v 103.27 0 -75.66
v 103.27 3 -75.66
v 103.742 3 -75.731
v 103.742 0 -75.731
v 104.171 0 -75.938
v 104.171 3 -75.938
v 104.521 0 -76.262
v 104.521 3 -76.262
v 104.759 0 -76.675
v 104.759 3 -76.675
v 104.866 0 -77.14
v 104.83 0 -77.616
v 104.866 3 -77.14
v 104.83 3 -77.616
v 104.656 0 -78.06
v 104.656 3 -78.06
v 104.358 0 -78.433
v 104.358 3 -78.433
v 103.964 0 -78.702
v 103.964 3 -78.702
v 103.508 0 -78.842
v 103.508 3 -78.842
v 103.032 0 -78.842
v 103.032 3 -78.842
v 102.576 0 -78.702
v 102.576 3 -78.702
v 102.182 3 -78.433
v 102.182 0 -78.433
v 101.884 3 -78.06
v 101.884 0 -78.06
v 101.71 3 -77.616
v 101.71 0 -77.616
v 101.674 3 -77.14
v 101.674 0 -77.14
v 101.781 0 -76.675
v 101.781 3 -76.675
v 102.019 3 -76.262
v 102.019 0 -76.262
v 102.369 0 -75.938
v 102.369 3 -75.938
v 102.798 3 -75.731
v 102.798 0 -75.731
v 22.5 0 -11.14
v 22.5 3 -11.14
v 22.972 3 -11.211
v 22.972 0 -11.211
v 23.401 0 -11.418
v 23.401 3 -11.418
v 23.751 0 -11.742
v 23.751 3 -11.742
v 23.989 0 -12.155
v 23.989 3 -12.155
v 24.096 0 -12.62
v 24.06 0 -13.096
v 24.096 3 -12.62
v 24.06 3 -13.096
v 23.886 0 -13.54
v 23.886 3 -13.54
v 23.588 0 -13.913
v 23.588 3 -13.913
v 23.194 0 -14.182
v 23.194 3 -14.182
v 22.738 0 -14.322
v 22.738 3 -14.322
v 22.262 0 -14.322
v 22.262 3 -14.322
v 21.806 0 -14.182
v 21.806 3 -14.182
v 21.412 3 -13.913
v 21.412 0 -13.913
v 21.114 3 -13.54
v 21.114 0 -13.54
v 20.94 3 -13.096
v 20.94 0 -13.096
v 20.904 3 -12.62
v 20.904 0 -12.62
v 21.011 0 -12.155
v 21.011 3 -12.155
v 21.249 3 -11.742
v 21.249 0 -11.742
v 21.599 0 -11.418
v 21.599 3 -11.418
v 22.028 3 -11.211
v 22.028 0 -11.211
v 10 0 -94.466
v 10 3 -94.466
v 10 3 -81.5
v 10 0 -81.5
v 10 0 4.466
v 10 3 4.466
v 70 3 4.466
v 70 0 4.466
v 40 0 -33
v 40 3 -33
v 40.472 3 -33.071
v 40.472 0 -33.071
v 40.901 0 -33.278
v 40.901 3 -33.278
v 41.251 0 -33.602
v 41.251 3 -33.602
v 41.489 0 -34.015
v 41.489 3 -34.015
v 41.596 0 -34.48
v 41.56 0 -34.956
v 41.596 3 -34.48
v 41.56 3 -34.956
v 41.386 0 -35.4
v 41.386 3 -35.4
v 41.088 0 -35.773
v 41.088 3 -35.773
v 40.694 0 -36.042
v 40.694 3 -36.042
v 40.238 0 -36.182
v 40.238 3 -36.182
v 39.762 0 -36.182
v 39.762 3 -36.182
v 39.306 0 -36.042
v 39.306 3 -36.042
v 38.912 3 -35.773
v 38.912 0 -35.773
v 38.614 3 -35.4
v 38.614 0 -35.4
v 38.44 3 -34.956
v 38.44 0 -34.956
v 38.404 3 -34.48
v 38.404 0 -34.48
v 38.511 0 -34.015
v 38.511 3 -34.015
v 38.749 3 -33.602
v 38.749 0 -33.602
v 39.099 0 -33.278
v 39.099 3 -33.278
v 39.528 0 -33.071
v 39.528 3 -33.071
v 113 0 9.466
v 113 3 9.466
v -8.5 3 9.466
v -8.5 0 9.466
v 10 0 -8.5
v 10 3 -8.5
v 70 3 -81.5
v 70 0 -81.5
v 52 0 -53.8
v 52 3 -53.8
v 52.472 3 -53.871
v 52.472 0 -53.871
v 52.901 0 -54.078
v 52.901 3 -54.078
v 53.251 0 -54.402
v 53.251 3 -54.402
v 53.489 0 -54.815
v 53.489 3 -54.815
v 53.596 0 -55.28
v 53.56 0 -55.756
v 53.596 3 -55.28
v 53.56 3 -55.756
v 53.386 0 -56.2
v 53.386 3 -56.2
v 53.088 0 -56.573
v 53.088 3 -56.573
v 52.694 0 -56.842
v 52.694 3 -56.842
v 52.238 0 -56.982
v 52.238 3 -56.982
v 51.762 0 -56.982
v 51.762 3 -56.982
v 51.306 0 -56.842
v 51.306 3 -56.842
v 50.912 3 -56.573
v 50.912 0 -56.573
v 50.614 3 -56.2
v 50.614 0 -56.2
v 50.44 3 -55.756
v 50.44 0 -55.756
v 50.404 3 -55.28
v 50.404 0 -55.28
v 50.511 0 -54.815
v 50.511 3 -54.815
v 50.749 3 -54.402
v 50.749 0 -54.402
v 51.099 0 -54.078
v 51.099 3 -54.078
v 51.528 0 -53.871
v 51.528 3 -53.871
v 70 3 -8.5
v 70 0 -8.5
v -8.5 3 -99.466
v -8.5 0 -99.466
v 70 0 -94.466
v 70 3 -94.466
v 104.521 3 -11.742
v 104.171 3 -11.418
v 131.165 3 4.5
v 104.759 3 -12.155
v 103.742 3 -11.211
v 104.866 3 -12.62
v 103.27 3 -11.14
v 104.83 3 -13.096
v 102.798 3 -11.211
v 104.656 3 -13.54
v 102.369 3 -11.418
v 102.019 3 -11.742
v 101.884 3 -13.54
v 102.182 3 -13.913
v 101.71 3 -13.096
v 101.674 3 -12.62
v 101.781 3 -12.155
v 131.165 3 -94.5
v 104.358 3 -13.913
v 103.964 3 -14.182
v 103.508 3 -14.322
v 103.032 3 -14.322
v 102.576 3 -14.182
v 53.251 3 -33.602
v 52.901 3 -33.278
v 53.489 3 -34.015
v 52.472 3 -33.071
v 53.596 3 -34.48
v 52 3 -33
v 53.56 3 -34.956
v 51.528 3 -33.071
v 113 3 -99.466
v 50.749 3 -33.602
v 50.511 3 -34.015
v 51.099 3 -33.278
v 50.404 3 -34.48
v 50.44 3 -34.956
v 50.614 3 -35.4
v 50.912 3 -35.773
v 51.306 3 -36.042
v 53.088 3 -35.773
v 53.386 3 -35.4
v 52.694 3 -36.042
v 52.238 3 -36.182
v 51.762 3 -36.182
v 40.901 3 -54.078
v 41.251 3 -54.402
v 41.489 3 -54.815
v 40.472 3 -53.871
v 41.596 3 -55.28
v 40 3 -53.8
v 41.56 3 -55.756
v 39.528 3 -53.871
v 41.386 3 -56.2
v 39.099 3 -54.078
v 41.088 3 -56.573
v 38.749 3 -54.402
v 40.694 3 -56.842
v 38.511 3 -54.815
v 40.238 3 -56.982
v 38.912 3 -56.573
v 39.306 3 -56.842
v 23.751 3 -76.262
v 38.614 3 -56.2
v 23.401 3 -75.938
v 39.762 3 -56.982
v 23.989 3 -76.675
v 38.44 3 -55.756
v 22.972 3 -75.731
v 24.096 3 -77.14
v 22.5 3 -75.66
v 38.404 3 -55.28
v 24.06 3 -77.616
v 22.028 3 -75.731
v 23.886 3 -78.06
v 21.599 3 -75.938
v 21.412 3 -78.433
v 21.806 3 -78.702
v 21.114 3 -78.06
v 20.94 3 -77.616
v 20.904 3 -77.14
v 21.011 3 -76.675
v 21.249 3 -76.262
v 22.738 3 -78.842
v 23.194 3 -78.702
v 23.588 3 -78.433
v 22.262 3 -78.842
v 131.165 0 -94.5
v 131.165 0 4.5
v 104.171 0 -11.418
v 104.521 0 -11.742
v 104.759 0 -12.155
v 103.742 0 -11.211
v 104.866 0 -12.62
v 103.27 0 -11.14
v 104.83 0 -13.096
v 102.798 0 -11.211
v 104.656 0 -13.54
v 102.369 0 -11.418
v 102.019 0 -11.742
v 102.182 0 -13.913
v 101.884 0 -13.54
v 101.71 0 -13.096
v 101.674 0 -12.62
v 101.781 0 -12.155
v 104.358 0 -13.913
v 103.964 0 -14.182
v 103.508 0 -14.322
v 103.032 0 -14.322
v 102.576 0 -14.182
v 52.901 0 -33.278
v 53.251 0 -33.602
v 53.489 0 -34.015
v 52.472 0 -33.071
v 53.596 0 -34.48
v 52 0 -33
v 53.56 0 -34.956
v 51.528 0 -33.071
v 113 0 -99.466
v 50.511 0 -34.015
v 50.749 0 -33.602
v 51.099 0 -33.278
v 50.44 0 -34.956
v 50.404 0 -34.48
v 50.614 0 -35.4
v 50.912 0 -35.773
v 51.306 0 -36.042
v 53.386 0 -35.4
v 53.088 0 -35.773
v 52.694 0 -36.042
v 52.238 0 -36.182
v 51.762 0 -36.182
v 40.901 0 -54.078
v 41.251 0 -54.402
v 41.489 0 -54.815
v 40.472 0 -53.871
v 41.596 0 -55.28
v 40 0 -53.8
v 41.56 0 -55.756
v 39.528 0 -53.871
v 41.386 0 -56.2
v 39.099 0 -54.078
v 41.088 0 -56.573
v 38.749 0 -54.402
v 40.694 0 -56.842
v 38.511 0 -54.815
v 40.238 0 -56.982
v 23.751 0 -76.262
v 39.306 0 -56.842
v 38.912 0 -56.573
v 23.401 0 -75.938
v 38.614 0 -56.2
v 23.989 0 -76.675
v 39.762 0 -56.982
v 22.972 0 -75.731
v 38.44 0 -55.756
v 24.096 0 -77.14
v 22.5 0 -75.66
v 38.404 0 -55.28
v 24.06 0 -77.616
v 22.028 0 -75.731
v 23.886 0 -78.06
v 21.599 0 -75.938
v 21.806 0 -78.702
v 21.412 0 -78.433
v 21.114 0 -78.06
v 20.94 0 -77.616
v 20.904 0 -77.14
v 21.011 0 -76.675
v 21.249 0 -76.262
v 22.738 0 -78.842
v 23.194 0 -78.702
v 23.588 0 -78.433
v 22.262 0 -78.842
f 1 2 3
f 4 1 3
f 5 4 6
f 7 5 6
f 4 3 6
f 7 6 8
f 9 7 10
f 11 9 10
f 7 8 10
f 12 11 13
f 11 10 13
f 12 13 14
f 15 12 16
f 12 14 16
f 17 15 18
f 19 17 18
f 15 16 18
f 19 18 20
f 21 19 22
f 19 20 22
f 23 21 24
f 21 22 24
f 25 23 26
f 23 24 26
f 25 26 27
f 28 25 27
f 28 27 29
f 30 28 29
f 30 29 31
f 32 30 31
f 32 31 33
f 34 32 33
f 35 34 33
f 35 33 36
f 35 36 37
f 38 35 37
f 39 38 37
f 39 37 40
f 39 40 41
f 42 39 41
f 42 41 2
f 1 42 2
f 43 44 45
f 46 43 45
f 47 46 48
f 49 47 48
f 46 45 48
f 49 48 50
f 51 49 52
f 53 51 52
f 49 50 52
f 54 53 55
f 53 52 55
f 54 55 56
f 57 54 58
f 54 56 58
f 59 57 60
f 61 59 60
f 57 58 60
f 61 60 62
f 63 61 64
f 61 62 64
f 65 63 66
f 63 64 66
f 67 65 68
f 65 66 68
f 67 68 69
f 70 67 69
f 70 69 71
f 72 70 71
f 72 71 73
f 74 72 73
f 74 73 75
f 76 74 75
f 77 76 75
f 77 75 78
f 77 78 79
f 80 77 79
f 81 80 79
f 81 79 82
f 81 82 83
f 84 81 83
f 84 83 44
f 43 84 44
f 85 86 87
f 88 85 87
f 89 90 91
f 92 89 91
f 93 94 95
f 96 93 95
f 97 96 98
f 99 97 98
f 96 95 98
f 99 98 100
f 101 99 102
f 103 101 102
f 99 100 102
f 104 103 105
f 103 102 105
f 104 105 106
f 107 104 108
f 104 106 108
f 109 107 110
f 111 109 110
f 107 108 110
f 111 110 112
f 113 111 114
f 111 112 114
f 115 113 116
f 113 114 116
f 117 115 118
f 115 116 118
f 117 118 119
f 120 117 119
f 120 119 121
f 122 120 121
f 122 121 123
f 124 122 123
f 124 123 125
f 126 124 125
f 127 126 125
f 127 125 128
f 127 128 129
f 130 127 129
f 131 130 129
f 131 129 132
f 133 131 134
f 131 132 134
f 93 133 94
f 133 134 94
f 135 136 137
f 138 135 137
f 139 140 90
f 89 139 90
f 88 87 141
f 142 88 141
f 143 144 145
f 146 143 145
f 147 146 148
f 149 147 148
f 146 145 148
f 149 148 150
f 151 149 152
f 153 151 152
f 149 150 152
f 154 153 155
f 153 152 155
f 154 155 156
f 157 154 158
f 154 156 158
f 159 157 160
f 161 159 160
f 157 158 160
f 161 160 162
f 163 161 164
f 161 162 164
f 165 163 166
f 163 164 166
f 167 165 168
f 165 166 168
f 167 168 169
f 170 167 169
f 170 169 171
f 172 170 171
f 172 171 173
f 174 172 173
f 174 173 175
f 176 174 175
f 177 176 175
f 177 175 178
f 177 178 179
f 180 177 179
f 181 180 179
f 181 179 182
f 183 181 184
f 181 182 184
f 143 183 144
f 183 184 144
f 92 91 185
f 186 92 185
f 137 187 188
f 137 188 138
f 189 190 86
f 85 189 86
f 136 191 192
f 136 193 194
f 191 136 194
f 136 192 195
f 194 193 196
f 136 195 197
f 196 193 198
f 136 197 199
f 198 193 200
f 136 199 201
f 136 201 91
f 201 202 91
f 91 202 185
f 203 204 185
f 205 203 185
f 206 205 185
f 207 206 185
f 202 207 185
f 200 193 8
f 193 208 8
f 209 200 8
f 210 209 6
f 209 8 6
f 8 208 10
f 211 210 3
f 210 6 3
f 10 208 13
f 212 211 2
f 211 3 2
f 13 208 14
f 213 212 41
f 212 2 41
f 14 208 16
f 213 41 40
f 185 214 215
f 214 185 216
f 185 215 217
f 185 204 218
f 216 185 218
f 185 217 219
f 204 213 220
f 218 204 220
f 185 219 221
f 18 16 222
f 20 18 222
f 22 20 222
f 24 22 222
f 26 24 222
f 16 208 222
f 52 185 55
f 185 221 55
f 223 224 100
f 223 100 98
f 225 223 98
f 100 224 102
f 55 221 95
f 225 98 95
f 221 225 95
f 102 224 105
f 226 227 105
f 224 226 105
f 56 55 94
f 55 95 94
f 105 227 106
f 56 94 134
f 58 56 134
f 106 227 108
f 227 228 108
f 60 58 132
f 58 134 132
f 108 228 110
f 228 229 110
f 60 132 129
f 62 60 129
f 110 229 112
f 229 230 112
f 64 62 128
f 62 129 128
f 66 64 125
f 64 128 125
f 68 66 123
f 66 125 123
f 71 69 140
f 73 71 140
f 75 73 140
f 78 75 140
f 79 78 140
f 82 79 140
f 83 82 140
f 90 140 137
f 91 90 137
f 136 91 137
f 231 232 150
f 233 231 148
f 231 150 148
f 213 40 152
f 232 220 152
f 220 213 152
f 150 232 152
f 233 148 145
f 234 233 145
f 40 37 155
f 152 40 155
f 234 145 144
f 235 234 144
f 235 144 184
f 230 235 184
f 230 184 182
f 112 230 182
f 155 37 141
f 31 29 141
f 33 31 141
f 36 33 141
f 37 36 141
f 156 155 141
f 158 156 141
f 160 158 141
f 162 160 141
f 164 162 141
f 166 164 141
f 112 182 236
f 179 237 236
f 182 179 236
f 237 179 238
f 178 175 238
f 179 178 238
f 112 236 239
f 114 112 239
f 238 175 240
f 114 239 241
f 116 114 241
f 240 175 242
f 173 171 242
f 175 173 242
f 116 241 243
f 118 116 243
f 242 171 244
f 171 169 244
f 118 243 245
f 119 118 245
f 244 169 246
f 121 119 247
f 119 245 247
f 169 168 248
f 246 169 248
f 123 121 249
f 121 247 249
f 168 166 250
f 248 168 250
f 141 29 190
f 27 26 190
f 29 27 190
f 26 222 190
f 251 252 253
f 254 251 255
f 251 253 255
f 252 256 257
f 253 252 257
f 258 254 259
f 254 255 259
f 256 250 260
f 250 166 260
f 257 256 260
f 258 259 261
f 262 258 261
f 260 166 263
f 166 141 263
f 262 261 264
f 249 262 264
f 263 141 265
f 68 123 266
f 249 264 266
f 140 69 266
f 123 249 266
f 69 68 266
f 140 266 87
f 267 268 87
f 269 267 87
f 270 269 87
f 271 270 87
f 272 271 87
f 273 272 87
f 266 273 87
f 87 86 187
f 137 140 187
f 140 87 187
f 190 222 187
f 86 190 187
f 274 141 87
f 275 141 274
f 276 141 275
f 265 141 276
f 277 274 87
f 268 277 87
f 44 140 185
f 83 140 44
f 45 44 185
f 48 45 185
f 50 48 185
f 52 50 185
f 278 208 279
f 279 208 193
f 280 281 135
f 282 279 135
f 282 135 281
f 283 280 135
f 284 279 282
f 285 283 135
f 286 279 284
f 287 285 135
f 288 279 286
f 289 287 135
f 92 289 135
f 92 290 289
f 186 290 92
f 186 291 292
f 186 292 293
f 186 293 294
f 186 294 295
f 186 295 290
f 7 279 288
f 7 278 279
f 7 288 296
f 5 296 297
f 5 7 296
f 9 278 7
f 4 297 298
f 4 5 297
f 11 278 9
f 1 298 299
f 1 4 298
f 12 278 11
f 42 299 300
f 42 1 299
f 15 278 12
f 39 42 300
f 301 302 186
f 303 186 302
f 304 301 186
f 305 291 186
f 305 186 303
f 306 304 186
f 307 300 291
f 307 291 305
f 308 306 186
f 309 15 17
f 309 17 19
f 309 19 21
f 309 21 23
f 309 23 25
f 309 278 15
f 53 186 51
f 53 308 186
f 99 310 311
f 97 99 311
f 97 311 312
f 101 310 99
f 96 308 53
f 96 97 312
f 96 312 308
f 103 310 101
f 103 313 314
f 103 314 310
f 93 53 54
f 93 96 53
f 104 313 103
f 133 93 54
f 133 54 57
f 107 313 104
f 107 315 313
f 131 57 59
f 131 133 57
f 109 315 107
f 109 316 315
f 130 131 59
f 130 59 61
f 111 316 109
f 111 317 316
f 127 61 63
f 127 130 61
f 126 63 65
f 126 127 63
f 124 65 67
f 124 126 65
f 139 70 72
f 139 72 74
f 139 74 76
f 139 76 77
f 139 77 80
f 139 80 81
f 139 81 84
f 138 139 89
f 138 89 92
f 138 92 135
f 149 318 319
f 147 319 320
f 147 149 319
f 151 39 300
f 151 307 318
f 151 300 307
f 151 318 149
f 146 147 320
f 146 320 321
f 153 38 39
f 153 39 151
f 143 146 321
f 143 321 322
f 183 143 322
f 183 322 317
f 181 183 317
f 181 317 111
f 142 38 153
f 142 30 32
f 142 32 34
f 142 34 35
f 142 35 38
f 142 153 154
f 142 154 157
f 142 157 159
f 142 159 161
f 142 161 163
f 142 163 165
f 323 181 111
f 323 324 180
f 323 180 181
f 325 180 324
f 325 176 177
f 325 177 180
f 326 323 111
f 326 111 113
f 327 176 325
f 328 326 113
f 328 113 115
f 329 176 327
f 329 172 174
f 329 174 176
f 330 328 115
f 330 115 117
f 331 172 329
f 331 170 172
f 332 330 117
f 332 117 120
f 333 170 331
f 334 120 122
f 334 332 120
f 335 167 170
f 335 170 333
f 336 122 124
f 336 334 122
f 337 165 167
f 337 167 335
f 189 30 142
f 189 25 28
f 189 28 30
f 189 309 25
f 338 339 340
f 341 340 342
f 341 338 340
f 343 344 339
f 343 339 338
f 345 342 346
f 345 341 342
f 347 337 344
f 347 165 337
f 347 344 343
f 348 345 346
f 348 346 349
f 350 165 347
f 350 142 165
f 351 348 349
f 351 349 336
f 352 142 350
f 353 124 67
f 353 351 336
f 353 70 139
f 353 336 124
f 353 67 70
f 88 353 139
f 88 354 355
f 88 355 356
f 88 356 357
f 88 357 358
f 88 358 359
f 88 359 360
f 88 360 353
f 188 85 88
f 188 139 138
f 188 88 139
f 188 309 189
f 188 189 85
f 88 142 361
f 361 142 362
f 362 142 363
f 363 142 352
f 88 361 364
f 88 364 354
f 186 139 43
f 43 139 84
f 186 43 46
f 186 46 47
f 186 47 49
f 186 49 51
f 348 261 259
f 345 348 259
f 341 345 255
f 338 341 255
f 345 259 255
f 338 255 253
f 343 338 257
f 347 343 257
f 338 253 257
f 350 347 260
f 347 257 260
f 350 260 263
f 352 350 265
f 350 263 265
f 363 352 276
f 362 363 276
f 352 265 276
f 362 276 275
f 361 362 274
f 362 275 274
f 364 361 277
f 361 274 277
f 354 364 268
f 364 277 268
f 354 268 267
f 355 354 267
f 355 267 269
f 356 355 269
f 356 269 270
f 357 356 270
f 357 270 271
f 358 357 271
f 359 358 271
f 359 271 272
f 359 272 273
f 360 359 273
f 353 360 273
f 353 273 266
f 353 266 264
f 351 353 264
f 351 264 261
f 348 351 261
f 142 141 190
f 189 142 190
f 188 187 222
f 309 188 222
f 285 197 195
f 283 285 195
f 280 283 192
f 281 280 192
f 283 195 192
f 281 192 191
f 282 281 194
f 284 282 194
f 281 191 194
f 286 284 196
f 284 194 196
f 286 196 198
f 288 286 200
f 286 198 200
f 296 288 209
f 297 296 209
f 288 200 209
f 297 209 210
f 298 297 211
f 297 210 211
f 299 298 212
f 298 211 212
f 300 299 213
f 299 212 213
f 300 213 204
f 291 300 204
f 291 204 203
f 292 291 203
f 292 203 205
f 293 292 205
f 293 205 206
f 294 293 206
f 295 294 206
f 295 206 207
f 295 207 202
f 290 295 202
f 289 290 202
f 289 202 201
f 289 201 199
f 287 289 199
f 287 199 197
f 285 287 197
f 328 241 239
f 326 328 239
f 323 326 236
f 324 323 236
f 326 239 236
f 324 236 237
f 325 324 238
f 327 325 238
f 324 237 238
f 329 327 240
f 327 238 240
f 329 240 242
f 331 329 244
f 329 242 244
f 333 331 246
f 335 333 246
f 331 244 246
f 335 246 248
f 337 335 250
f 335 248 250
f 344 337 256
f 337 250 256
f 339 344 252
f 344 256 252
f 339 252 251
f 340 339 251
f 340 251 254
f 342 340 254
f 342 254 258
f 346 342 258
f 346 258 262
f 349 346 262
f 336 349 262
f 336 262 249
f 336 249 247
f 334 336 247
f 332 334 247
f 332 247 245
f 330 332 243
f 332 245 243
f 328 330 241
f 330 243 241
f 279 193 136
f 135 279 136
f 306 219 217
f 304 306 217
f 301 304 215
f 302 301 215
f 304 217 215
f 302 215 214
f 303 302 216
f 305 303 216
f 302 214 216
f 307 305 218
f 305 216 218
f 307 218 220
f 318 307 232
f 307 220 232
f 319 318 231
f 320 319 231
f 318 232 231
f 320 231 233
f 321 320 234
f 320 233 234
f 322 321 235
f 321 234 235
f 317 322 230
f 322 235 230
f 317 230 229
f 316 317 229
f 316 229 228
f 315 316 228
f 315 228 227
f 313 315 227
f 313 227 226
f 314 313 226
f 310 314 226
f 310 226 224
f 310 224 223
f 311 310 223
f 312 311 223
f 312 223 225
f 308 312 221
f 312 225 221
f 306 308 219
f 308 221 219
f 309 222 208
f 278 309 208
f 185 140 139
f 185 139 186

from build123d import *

# Parameters (mm, degrees)
SKETCH1_W           = 110
SKETCH1_H           = 90
BOSS_EXTRUDE1_DEPTH = 3
SKETCH2_W           = 60
SKETCH2_H           = 8.5
SKETCH2_R           = 1.6
CUT_EXTRUDE1_DEPTH  = 3
SKETCH4_R           = 1.6
CUT_EXTRUDE2_DEPTH  = 10
BOSS_EXTRU_1_DEPTH  = 3


with BuildPart() as part:
    # Sketch1 → Boss-Extrude1 (new body)
    with BuildSketch(Plane(origin=(0, 0, 0), x_dir=(1, 0, 0), z_dir=(0, 1, 0))):
        with Locations((55, 45)):
            Rectangle(SKETCH1_W, SKETCH1_H)
    extrude(amount=BOSS_EXTRUDE1_DEPTH)

    # Sketch2 → Cut-Extrude1 (cut)
    with BuildSketch(Plane(origin=(0, 3, 0), x_dir=(1, 0, 0), z_dir=(0, 1, 0))):
        with Locations((40, 85.75)):
            Rectangle(SKETCH2_W, SKETCH2_H)
        with Locations((40, 4.25)):
            Rectangle(SKETCH2_W, SKETCH2_H)
        with Locations(Location((40, 55.4, 0), (0, 0, 270))):
            Circle(SKETCH2_R)
        with Locations(Location((52, 55.4, 0), (0, 0, 270))):
            Circle(SKETCH2_R)
        with Locations(Location((52, 34.6, 0), (0, 0, 270))):
            Circle(SKETCH2_R)
        with Locations(Location((40, 34.6, 0), (0, 0, 270))):
            Circle(SKETCH2_R)
    extrude(amount=-CUT_EXTRUDE1_DEPTH, mode=Mode.SUBTRACT)

    # Sketch4 → Cut-Extrude2 (cut)
    with BuildSketch(Plane(origin=(0, 3, 0), x_dir=(1, 0, 0), z_dir=(0, 1, 0))):
        with Locations(Location((22.5, 77.26, 0), (0, 0, 270))):
            Circle(SKETCH4_R)
        with Locations(Location((22.5, 12.74, 0), (0, 0, 270))):
            Circle(SKETCH4_R)
        with Locations(Location((103.27, 12.74, 0), (0, 0, 270))):
            Circle(SKETCH4_R)
        with Locations(Location((103.27, 77.26, 0), (0, 0, 270))):
            Circle(SKETCH4_R)
    extrude(amount=-CUT_EXTRUDE2_DEPTH, mode=Mode.SUBTRACT)

    # Esquisse1 → Boss.-Extru.1 (add)
    with BuildSketch(Plane(origin=(0, 3, 0), x_dir=(1, 0, 0), z_dir=(0, 1, 0))):
        Polygon((113, -9.466090987), (-8.5, -9.466090987), (-8.5, -4.466090987), (-8.5, 94.466090987), (-8.5, 99.466090987), (113, 99.466090987), (131.165303172, 94.5), (131.165303172, -4.5), align=None)
        Polygon((10, 0), (10, -4.466090987), (70, -4.466090987), (70, 0), (110, 0), (110, 90), (70, 90), (70, 94.466090987), (10, 94.466090987), (10, 90), (0, 90), (0, 0), align=None, mode=Mode.SUBTRACT)
    extrude(amount=-BOSS_EXTRU_1_DEPTH)


solid = part.part
